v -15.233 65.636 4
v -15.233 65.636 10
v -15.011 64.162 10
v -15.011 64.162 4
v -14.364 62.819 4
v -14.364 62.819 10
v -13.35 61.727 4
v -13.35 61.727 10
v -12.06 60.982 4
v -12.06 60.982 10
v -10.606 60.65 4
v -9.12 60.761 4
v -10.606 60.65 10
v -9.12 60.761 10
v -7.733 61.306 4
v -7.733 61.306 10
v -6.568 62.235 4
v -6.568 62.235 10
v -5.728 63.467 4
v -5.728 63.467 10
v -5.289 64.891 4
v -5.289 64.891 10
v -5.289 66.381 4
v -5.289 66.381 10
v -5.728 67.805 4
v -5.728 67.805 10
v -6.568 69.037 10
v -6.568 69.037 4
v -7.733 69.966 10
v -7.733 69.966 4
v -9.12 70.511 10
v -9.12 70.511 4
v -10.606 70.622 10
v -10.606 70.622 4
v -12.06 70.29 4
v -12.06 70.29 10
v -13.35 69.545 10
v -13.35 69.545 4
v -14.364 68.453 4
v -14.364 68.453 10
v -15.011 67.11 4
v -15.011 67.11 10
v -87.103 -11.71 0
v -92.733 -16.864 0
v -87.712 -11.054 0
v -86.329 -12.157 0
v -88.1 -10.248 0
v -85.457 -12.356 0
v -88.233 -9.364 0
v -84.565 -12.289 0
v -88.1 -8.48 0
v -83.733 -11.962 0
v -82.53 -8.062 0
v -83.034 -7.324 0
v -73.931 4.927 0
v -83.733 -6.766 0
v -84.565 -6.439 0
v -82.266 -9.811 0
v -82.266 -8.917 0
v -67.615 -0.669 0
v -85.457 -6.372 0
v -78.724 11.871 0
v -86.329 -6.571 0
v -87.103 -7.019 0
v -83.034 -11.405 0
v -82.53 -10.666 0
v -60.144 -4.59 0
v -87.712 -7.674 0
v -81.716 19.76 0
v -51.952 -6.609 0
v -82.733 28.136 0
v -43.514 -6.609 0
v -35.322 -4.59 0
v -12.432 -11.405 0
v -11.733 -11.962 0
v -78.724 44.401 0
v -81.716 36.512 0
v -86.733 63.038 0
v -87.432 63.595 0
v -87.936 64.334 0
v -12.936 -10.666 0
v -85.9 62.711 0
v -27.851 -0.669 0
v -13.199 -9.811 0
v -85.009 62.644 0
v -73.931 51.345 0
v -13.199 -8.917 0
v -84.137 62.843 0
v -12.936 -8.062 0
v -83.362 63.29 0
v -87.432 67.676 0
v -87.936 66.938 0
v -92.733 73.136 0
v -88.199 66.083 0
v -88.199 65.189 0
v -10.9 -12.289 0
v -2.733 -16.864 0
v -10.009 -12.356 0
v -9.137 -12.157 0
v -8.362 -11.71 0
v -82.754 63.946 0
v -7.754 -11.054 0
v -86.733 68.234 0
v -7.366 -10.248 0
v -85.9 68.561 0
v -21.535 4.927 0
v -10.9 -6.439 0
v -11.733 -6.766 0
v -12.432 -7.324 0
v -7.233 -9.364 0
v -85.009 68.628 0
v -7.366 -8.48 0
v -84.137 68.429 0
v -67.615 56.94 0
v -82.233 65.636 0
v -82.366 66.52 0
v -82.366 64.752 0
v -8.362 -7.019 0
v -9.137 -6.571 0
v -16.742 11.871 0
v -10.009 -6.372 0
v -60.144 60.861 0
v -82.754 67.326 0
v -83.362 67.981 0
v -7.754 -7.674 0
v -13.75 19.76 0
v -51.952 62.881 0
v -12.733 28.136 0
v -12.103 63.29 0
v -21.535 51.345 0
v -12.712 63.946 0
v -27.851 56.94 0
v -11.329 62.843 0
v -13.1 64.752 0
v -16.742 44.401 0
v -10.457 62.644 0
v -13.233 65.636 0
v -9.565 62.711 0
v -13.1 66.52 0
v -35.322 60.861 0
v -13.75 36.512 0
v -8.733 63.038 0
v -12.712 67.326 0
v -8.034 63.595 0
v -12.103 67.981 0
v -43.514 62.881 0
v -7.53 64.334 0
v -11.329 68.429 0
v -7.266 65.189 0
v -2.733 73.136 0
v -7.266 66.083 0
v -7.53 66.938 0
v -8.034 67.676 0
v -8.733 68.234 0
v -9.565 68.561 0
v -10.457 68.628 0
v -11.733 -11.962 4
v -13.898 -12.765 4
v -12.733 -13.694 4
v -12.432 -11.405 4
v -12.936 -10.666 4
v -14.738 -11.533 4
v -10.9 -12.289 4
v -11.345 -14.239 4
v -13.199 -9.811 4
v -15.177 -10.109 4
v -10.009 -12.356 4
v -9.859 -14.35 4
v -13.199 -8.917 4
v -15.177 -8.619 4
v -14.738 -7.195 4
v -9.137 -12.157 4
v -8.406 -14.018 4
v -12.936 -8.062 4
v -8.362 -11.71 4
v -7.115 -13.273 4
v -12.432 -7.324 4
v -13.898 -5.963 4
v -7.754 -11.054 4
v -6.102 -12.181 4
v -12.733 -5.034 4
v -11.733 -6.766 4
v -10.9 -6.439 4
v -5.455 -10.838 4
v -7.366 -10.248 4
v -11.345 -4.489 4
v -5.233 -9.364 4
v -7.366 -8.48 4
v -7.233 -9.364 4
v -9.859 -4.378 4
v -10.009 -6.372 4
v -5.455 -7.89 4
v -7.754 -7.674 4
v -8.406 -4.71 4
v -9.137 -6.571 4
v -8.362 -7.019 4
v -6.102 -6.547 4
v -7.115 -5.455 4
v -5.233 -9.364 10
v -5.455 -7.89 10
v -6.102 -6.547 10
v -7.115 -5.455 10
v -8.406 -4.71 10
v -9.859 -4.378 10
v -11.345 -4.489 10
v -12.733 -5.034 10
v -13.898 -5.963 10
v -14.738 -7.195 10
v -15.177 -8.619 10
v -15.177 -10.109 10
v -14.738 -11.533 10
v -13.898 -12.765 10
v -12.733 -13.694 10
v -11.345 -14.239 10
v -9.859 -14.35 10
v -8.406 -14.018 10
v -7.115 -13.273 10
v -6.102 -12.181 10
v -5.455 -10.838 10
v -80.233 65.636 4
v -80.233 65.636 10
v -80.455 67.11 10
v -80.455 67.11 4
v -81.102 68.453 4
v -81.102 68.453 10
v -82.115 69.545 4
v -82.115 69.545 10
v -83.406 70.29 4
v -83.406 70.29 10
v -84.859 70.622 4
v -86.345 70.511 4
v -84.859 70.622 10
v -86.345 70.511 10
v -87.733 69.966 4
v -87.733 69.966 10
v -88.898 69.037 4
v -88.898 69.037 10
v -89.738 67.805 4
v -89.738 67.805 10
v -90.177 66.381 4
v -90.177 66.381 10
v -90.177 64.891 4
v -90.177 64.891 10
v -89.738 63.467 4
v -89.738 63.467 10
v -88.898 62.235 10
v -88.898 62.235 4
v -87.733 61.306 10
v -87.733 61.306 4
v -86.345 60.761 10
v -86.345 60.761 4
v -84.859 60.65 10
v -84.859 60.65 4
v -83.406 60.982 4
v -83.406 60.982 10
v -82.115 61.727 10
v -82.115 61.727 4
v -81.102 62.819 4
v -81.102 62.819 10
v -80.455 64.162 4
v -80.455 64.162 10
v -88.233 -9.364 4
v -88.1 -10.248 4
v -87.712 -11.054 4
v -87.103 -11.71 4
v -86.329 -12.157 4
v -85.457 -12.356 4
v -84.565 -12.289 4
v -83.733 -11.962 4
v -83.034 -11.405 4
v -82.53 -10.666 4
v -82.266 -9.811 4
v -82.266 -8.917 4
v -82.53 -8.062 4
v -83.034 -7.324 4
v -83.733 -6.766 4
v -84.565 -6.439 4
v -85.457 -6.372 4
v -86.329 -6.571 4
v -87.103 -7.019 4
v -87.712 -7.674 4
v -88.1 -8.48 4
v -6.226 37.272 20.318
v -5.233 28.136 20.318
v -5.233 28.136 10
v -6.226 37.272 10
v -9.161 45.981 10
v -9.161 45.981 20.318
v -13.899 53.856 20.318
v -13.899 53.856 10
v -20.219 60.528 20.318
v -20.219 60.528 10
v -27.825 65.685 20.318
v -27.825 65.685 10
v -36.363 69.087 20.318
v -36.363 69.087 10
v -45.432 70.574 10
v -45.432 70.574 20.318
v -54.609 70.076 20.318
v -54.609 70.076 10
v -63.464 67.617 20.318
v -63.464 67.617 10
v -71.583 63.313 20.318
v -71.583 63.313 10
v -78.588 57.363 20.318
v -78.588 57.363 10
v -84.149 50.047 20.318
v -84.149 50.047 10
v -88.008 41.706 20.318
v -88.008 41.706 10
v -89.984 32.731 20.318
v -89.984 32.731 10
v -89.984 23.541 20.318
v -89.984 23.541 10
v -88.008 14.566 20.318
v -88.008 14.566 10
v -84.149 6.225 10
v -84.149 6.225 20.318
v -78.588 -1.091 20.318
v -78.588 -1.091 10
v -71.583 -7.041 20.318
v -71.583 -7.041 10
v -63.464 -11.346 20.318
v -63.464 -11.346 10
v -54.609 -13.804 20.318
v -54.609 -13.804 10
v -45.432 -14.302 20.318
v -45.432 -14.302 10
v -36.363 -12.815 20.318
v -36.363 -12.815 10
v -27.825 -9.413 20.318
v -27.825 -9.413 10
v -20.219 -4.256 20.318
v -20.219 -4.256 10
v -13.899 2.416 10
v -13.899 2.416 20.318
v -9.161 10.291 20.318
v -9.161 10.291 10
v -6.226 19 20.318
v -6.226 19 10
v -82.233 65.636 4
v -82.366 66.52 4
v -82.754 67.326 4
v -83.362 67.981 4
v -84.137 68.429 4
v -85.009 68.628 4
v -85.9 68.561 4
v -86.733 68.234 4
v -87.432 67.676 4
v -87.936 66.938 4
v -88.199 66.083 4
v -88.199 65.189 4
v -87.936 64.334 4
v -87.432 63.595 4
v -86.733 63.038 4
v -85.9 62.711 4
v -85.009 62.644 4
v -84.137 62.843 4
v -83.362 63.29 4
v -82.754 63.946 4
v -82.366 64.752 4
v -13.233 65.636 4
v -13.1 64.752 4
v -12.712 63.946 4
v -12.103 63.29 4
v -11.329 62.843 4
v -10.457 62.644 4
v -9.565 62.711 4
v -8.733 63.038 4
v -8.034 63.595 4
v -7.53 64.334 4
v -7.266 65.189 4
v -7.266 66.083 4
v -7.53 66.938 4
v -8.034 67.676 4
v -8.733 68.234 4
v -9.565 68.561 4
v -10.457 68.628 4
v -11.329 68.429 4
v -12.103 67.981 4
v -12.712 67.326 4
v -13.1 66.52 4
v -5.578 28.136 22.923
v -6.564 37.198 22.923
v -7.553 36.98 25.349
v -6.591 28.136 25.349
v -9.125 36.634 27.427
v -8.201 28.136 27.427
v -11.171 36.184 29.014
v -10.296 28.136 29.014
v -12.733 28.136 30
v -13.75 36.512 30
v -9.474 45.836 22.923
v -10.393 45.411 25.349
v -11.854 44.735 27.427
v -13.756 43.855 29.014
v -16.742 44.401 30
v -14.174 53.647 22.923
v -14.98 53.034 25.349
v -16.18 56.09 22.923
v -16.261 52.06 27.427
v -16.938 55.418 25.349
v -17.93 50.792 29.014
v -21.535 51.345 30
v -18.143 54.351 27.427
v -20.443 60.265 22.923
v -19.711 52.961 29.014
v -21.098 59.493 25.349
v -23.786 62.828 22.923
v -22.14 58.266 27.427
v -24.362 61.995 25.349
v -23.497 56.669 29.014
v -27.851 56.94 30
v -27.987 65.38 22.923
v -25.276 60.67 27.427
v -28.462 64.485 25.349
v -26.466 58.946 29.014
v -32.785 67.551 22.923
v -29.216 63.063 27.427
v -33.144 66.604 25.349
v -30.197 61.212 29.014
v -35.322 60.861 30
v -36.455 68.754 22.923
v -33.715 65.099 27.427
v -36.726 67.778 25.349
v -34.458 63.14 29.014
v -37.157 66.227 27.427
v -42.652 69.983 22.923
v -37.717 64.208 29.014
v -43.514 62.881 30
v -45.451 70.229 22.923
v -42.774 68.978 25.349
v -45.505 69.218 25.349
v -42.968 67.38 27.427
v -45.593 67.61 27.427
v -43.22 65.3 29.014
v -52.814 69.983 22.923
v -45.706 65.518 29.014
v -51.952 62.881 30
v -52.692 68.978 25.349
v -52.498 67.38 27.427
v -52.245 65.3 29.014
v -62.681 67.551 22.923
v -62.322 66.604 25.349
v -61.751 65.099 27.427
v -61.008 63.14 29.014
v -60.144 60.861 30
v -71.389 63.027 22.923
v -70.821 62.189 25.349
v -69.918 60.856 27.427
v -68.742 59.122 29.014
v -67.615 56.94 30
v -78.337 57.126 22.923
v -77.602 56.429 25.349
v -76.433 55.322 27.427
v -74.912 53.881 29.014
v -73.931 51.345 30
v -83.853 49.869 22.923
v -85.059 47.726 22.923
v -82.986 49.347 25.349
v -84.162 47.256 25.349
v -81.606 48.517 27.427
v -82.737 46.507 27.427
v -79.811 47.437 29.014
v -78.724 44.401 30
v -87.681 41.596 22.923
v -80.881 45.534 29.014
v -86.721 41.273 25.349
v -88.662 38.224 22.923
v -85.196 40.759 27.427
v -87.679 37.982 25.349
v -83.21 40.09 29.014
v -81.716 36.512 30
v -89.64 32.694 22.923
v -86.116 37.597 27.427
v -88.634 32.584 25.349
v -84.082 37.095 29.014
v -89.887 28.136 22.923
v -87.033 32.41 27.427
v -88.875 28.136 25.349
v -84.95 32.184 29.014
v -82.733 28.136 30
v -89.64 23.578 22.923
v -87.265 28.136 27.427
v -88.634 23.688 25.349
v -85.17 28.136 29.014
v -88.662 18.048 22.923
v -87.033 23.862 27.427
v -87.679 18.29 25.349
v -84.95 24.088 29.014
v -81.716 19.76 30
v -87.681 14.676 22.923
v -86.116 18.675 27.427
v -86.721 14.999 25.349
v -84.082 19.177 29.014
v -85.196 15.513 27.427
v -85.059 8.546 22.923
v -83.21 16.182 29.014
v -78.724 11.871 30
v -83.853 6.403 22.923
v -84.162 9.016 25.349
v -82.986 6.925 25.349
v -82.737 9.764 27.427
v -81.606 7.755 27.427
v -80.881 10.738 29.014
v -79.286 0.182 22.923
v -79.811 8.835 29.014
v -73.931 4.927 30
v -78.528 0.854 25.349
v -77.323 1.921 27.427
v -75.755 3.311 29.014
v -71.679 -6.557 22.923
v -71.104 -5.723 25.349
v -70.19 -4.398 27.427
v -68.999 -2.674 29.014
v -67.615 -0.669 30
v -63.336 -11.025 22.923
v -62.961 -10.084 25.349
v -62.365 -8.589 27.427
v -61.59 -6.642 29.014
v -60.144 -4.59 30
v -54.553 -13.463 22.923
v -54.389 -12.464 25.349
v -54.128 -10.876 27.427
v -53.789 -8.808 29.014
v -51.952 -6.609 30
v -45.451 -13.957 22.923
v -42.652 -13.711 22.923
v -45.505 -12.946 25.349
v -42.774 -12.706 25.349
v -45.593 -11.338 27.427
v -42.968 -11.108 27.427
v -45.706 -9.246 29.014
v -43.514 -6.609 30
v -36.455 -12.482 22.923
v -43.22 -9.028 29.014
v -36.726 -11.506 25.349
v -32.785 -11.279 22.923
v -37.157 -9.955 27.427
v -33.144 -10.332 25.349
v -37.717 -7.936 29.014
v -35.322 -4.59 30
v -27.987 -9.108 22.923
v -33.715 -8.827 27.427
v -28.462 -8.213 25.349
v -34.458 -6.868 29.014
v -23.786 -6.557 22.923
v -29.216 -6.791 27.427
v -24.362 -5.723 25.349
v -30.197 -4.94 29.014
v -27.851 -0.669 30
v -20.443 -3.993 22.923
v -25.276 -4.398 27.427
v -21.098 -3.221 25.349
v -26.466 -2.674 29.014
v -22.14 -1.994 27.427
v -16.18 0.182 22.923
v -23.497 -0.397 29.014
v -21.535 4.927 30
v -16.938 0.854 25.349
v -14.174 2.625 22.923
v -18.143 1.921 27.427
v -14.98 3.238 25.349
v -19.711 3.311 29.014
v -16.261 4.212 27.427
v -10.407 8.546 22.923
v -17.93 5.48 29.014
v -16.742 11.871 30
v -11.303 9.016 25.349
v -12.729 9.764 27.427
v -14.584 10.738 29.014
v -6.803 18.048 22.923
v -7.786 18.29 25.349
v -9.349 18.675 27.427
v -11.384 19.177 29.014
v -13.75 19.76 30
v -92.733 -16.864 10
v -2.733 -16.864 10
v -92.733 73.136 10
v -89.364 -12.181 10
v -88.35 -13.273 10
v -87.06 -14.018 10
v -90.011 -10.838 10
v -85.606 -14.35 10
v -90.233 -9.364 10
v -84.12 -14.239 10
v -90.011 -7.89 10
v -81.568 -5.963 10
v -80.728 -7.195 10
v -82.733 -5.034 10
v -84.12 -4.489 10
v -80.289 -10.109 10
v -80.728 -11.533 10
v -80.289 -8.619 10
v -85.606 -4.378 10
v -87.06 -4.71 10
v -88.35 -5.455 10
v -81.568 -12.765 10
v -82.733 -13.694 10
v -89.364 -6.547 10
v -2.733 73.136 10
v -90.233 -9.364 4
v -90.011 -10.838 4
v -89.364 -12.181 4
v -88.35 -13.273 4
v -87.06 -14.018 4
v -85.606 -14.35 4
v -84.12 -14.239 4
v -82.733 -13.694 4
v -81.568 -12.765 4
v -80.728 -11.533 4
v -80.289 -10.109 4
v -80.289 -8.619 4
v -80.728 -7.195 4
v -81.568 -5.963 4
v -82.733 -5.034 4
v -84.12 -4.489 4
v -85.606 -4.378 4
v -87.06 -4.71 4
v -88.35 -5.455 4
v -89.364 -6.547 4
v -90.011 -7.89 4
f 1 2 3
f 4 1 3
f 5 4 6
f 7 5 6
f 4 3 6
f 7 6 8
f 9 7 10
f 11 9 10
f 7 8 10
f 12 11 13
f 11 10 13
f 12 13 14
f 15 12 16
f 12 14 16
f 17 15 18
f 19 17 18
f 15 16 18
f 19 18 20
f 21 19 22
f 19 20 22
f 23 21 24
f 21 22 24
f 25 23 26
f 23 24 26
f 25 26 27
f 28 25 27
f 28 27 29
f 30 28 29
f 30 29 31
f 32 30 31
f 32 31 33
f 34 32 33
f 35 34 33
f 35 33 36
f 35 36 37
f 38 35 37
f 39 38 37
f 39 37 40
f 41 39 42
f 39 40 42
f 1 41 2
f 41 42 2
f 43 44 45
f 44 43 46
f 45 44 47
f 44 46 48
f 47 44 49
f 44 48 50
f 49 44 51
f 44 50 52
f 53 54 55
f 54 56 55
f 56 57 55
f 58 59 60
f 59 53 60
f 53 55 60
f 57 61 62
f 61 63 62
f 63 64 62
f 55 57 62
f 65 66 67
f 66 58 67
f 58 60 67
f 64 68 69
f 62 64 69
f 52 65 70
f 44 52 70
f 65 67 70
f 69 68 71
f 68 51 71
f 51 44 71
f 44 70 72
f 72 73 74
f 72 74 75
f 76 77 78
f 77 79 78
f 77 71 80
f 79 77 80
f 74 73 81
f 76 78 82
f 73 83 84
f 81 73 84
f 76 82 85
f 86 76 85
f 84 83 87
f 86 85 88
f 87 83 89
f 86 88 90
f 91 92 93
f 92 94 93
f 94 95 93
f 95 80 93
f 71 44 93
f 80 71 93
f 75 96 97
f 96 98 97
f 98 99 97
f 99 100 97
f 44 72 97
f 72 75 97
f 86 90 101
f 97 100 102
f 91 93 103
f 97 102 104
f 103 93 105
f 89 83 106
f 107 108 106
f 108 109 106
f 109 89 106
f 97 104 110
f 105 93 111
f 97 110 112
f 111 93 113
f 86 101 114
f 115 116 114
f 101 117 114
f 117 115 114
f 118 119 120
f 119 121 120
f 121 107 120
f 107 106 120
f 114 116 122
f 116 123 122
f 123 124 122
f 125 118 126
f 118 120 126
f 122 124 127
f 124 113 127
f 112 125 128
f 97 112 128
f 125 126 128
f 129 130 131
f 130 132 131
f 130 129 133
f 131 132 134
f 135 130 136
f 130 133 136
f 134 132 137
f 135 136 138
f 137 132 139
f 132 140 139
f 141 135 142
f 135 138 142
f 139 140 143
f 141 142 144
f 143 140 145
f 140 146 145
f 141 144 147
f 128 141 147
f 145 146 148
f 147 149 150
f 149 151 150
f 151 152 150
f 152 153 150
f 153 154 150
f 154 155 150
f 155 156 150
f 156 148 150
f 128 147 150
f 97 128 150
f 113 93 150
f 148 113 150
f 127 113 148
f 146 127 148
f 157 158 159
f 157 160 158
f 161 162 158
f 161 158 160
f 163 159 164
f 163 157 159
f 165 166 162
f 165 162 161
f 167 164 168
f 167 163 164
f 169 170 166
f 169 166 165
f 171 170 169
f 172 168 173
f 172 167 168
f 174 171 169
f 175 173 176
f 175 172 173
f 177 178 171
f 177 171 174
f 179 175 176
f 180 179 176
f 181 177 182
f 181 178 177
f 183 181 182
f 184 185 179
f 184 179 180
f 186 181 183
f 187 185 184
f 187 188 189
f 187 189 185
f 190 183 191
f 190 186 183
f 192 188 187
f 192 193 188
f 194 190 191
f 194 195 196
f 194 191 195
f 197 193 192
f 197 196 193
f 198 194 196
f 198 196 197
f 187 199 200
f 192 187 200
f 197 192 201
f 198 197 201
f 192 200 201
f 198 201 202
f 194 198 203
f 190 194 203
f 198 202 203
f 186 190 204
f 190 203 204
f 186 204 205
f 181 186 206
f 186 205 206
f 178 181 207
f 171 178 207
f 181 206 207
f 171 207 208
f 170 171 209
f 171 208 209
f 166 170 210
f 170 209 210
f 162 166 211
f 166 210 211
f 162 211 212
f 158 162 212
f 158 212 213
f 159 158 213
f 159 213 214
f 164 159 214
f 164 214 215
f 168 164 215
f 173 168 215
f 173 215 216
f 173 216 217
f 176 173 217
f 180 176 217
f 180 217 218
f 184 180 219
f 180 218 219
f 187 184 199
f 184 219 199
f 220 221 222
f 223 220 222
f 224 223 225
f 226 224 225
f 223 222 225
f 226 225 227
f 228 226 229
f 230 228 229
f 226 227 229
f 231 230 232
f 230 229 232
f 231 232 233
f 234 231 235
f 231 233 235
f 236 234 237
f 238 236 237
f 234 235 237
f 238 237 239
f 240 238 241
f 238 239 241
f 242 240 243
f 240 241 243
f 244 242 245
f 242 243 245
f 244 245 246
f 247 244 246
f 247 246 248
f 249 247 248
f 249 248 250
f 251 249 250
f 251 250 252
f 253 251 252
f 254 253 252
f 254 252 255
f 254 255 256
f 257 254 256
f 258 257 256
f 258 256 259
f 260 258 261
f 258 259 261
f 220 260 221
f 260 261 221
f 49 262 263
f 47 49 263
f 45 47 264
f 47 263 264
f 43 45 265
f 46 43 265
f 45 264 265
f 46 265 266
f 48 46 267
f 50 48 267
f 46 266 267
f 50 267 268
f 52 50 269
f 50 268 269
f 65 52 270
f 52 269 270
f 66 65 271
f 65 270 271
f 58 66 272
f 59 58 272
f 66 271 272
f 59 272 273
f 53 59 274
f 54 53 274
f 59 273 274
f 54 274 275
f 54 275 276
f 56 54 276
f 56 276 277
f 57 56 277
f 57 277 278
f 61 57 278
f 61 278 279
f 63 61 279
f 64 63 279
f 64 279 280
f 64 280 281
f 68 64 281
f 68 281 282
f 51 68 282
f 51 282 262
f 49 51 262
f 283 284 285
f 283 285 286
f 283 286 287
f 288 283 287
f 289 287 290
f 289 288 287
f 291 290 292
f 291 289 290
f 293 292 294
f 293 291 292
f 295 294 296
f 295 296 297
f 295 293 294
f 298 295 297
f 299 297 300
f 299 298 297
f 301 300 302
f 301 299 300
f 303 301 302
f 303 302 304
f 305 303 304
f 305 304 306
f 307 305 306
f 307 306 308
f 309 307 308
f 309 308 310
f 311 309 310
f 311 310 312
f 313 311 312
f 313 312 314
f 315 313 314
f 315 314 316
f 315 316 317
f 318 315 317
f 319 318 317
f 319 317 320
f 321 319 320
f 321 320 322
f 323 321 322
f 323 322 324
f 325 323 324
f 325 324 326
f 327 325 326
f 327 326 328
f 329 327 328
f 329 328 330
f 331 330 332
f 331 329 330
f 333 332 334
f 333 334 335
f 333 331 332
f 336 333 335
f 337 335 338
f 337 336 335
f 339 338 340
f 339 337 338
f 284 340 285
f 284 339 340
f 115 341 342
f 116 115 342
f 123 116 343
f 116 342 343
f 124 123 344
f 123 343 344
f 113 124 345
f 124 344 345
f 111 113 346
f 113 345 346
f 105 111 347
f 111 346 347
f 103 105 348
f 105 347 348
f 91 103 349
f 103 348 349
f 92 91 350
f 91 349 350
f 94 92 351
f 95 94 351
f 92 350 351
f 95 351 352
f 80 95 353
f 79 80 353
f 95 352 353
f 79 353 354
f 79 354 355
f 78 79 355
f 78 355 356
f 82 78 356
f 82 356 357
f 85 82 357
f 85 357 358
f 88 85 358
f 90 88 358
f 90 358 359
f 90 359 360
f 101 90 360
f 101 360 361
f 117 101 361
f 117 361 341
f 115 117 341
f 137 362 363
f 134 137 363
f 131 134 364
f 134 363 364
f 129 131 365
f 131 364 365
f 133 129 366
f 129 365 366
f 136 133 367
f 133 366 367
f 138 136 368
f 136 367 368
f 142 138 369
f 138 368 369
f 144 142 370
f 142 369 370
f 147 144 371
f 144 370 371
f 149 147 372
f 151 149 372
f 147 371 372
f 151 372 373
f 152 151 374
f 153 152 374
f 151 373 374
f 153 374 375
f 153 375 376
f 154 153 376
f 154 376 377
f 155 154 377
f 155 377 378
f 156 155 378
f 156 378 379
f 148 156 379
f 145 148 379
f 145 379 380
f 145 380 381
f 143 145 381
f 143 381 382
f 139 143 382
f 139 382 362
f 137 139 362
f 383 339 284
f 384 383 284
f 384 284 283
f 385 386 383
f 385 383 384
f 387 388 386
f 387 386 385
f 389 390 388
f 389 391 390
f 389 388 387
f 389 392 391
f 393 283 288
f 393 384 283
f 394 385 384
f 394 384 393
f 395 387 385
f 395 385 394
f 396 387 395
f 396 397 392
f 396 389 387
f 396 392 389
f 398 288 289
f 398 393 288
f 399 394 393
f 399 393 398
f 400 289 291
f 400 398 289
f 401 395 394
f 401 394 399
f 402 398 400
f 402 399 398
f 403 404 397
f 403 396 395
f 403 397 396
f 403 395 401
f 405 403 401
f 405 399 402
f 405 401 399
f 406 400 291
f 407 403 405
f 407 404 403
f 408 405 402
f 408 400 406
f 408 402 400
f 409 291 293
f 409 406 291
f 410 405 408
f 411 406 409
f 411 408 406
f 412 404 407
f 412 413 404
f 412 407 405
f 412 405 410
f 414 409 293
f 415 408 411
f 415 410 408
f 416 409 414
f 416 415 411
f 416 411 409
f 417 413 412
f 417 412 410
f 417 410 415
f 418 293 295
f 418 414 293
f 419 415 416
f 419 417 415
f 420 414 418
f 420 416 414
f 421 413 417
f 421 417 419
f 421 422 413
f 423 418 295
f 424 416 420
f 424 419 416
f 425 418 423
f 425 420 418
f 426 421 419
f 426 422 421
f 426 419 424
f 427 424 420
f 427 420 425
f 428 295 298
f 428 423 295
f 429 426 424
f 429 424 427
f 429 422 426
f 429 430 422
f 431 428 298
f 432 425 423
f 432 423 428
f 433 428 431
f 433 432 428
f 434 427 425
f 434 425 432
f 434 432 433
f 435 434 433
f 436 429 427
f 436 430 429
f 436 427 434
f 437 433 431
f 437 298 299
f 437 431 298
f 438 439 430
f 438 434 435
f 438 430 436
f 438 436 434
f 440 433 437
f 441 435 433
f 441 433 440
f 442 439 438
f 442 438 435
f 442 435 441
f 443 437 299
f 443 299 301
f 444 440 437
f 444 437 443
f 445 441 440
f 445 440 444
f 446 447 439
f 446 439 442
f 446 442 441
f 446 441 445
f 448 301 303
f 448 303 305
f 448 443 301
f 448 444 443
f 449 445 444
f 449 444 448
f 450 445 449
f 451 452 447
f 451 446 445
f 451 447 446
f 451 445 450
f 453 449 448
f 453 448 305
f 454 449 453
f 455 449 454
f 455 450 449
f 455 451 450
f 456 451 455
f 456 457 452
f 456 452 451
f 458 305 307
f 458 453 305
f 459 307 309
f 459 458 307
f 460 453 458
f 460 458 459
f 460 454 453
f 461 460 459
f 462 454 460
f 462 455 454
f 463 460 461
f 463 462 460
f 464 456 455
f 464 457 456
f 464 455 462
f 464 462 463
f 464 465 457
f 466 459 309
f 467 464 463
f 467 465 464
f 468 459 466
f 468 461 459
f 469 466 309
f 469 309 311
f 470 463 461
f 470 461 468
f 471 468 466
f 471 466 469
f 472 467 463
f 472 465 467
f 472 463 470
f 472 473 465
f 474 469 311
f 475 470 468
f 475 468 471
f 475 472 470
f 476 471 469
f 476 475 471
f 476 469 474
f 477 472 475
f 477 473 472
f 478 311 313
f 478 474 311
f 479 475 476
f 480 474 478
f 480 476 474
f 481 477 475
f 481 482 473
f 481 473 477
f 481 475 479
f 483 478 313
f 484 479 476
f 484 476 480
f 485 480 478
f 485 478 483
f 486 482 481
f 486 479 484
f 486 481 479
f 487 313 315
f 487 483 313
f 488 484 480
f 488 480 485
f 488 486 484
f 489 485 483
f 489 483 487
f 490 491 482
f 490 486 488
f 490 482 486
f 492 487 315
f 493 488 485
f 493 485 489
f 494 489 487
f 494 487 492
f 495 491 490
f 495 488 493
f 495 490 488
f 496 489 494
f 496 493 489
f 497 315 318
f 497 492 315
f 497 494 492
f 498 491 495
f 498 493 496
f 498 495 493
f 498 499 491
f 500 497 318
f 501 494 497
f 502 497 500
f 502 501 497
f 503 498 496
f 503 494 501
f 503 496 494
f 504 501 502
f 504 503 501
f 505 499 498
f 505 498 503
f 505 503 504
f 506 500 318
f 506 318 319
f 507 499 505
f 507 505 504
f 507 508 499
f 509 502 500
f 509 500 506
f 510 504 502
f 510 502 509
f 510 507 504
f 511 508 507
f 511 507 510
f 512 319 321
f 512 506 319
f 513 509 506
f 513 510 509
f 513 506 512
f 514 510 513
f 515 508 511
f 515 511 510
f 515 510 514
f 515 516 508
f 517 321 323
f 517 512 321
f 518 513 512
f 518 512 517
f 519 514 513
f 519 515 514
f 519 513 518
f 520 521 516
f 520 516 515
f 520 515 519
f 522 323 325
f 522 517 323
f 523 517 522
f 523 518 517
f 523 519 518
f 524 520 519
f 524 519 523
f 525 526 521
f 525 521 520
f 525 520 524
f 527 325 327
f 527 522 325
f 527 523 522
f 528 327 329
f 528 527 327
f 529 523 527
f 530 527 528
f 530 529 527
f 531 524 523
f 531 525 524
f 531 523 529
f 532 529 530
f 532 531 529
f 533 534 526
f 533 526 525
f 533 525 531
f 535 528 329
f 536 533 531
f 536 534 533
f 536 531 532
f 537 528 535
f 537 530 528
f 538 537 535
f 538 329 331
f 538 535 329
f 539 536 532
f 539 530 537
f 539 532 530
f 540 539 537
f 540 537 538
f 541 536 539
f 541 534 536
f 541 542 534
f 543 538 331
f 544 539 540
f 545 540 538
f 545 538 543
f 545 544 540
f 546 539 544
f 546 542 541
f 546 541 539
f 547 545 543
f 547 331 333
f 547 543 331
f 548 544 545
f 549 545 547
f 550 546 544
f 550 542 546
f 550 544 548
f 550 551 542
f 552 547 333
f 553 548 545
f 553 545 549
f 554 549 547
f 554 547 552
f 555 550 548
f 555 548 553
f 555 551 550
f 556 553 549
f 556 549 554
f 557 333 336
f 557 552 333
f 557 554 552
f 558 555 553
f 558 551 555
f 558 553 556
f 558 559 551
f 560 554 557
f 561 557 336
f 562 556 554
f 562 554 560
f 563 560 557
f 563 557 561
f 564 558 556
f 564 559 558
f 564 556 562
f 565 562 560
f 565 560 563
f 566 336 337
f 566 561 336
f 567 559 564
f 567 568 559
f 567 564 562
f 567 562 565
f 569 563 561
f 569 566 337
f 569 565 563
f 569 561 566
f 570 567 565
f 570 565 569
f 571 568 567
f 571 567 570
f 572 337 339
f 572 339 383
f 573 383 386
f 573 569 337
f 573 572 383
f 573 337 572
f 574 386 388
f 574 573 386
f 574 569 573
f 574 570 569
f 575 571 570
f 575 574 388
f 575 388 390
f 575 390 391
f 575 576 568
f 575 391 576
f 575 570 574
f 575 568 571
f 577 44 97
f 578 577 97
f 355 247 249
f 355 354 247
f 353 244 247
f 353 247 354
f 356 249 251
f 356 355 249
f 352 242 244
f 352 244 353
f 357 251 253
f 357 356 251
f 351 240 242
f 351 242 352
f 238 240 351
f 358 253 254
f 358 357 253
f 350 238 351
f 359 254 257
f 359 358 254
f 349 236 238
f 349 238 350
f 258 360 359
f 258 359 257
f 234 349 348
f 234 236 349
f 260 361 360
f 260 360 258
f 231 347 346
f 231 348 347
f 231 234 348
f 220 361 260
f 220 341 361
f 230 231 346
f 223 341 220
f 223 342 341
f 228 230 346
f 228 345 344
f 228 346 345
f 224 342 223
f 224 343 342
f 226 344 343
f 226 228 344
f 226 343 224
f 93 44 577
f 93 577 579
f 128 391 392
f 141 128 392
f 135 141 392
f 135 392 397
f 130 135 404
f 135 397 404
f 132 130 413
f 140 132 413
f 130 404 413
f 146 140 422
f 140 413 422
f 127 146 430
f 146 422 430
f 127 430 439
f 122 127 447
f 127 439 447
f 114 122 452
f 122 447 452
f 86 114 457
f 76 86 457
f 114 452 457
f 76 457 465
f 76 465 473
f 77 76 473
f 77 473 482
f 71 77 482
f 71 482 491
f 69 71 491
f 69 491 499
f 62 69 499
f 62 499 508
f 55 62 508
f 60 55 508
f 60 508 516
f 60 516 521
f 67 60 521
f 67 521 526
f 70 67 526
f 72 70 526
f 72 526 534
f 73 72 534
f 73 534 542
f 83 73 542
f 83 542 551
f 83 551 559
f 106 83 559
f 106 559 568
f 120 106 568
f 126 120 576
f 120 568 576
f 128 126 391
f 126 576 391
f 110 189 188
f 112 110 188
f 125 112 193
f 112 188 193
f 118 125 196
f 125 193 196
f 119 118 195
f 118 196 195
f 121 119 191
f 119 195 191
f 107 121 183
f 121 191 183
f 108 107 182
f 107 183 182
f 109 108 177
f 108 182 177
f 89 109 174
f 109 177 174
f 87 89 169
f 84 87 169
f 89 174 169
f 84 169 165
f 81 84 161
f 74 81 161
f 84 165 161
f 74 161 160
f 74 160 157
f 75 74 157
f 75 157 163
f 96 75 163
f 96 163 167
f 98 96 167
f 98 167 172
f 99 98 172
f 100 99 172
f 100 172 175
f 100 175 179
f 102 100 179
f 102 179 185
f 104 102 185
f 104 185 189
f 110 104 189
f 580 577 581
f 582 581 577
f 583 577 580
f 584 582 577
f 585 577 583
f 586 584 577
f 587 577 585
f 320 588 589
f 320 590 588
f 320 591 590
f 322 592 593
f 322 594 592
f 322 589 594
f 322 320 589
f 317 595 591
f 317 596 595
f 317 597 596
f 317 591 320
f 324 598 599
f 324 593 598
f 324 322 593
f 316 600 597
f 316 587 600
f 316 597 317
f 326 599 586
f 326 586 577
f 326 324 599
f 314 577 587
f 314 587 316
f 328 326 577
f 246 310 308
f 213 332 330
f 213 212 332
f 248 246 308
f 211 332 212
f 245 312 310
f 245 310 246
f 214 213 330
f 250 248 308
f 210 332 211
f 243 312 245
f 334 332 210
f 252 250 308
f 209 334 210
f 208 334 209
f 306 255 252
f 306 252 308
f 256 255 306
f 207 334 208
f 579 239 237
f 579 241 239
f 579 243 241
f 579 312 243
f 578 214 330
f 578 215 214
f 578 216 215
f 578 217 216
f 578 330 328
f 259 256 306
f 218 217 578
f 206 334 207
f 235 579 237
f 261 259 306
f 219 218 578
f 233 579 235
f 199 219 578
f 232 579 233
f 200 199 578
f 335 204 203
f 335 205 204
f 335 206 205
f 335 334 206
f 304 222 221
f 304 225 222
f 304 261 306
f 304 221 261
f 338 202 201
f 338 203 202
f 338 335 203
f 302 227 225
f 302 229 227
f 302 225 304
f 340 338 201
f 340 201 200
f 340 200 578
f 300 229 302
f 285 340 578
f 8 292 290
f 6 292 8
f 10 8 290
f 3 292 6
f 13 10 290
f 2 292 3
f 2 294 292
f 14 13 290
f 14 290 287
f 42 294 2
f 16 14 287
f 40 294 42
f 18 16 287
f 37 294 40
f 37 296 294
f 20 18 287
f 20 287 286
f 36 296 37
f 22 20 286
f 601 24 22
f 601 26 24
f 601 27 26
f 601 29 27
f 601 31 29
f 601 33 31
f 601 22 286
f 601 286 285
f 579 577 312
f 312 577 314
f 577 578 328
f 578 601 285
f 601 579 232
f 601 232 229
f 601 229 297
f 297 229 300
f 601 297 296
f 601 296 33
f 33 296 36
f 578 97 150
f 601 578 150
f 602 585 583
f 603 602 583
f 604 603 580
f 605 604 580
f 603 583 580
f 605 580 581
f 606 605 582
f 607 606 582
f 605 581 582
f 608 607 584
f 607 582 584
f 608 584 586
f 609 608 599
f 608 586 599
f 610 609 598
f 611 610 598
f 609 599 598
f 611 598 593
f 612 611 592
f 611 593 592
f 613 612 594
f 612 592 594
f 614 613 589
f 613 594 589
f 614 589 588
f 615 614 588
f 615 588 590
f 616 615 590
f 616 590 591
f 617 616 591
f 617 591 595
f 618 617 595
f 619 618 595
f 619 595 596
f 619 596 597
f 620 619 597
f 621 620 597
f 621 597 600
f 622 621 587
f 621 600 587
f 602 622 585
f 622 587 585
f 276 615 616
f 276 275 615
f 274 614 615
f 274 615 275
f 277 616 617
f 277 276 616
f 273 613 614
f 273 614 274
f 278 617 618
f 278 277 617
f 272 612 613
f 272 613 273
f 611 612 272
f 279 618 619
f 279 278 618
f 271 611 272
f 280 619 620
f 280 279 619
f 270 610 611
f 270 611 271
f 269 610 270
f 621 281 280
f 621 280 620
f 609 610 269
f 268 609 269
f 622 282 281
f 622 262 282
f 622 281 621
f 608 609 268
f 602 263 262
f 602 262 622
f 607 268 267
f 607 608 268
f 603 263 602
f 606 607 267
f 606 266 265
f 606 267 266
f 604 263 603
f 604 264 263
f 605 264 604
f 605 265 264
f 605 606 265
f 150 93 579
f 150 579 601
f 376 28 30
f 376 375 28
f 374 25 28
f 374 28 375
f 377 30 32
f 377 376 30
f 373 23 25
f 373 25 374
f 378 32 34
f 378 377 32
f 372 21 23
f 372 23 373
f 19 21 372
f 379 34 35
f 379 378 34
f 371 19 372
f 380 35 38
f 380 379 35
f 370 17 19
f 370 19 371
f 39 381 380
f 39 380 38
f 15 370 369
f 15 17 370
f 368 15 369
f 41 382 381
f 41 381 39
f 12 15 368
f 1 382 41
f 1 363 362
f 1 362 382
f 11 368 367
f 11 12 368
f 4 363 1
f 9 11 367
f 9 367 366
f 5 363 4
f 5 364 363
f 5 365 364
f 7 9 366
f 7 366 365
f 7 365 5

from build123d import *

# Parameters (mm, degrees)
SKETCH_1_W          = 90
SKETCH_1_H          = 90
EXTRUDE_3_DEPTH     = 10
SKETCH_3_R          = 35
CUT_EXTRUDE_2_DEPTH = 10
EXTRUDE_START       = 20
SKETCH_4_R          = 42.5
SKETCH_4_R_2        = 35
EXTRUDE_4_DEPTH     = 20
FILLET_1_R          = 10
SKETCH_5_R          = 3
CUT_EXTRUDE_3_DEPTH = 10
SKETCH_6_R          = 5
CUT_EXTRUDE_4_DEPTH = 6


with BuildPart() as part:
    # 스케치1 → 보스-돌출3 (new body)
    with BuildSketch(Plane.XY):
        with Locations((-47.732849402, 28.135926797)):
            Rectangle(SKETCH_1_W, SKETCH_1_H)
    extrude(amount=EXTRUDE_3_DEPTH)

    # 스케치3 → 컷-돌출2 (cut)
    with BuildSketch(Plane.XY.offset(10)):
        with Locations((-47.732849402, 28.135926797)):
            Circle(SKETCH_3_R)
    extrude(amount=-CUT_EXTRUDE_2_DEPTH, mode=Mode.SUBTRACT)

    # 스케치4 → 보스-돌출4 (add)
    with BuildSketch(Plane.XY.offset(10).offset(EXTRUDE_START)):
        with Locations((-47.732849402, 28.135926797)):
            Circle(SKETCH_4_R)
        with Locations((-47.732849402, 28.135926797)):
            Circle(SKETCH_4_R_2, mode=Mode.SUBTRACT)
    extrude(amount=-EXTRUDE_4_DEPTH)

    # 필렛1
    # the kernel refuses this fillet: 10 mm, written as the material it takes off along each edge
    with BuildSketch(Plane(origin=(-47.732849402, 28.135926797, 30), x_dir=(1, 0, 0), z_dir=(0, -1, 0))) as fillet_1_piece_1:
        with BuildLine():
            CenterArc((32.5, -9.682458366), FILLET_1_R, 0, 75.522487814)
            Line((35, 0), (35.05, 0.193649167))
            ThreePointArc((35.05, 0.193649167), (38.75, 0.2), (42.5, 0.2))
            Line((42.5, 0.2), (42.7, 0))
            Line((42.7, 0), (42.7, -9.682458366))
            Line((42.7, -9.682458366), (42.5, -9.682458366))
        make_face()
    revolve(axis=Axis((-47.732849402, 28.135926797, 30), (0, 0, 1)), mode=Mode.SUBTRACT)

    # 스케치5 → 컷-돌출3 (cut)
    with BuildSketch(Plane.XY.offset(10)):
        with Locations((-85.232849402, 65.635926797)):
            Circle(SKETCH_5_R)
        with Locations(Location((-10.232849402, 65.635926797, 0), (0, 0, 180))):
            Circle(SKETCH_5_R)
        with Locations((-10.232849402, -9.364073203)):
            Circle(SKETCH_5_R)
        with Locations(Location((-85.232849402, -9.364073203, 0), (0, 0, 180))):
            Circle(SKETCH_5_R)
    extrude(amount=-CUT_EXTRUDE_3_DEPTH, mode=Mode.SUBTRACT)

    # 스케치6 → 컷-돌출4 (cut)
    with BuildSketch(Plane.XY.offset(10)):
        with Locations((-85.232849402, 65.635926797)):
            Circle(SKETCH_6_R)
        with Locations(Location((-10.232849402, 65.635926797, 0), (0, 0, 180))):
            Circle(SKETCH_6_R)
        with Locations((-10.232849402, -9.364073203)):
            Circle(SKETCH_6_R)
        with Locations(Location((-85.232849402, -9.364073203, 0), (0, 0, 180))):
            Circle(SKETCH_6_R)
    extrude(amount=-CUT_EXTRUDE_4_DEPTH, mode=Mode.SUBTRACT)


solid = part.part
